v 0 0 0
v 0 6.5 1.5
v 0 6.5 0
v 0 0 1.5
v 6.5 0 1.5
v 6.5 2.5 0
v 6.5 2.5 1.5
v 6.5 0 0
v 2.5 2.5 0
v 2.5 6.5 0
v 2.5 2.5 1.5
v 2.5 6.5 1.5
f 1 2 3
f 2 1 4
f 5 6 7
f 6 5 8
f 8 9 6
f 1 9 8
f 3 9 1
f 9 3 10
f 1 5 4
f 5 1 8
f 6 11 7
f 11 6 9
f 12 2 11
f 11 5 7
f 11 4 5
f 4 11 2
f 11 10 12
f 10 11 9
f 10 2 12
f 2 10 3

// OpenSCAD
// minkowski with a non-convex operand (L-shaped prism and a cube).
// With a rounded second operand OpenSCAD's own output is not deterministic
// (convex parts are unioned in parallel), so a cube is used here.
minkowski() {
  linear_extrude(1) polygon([[0, 0], [6, 0], [6, 2], [2, 2], [2, 6], [0, 6]]);
  cube(0.5);
}
